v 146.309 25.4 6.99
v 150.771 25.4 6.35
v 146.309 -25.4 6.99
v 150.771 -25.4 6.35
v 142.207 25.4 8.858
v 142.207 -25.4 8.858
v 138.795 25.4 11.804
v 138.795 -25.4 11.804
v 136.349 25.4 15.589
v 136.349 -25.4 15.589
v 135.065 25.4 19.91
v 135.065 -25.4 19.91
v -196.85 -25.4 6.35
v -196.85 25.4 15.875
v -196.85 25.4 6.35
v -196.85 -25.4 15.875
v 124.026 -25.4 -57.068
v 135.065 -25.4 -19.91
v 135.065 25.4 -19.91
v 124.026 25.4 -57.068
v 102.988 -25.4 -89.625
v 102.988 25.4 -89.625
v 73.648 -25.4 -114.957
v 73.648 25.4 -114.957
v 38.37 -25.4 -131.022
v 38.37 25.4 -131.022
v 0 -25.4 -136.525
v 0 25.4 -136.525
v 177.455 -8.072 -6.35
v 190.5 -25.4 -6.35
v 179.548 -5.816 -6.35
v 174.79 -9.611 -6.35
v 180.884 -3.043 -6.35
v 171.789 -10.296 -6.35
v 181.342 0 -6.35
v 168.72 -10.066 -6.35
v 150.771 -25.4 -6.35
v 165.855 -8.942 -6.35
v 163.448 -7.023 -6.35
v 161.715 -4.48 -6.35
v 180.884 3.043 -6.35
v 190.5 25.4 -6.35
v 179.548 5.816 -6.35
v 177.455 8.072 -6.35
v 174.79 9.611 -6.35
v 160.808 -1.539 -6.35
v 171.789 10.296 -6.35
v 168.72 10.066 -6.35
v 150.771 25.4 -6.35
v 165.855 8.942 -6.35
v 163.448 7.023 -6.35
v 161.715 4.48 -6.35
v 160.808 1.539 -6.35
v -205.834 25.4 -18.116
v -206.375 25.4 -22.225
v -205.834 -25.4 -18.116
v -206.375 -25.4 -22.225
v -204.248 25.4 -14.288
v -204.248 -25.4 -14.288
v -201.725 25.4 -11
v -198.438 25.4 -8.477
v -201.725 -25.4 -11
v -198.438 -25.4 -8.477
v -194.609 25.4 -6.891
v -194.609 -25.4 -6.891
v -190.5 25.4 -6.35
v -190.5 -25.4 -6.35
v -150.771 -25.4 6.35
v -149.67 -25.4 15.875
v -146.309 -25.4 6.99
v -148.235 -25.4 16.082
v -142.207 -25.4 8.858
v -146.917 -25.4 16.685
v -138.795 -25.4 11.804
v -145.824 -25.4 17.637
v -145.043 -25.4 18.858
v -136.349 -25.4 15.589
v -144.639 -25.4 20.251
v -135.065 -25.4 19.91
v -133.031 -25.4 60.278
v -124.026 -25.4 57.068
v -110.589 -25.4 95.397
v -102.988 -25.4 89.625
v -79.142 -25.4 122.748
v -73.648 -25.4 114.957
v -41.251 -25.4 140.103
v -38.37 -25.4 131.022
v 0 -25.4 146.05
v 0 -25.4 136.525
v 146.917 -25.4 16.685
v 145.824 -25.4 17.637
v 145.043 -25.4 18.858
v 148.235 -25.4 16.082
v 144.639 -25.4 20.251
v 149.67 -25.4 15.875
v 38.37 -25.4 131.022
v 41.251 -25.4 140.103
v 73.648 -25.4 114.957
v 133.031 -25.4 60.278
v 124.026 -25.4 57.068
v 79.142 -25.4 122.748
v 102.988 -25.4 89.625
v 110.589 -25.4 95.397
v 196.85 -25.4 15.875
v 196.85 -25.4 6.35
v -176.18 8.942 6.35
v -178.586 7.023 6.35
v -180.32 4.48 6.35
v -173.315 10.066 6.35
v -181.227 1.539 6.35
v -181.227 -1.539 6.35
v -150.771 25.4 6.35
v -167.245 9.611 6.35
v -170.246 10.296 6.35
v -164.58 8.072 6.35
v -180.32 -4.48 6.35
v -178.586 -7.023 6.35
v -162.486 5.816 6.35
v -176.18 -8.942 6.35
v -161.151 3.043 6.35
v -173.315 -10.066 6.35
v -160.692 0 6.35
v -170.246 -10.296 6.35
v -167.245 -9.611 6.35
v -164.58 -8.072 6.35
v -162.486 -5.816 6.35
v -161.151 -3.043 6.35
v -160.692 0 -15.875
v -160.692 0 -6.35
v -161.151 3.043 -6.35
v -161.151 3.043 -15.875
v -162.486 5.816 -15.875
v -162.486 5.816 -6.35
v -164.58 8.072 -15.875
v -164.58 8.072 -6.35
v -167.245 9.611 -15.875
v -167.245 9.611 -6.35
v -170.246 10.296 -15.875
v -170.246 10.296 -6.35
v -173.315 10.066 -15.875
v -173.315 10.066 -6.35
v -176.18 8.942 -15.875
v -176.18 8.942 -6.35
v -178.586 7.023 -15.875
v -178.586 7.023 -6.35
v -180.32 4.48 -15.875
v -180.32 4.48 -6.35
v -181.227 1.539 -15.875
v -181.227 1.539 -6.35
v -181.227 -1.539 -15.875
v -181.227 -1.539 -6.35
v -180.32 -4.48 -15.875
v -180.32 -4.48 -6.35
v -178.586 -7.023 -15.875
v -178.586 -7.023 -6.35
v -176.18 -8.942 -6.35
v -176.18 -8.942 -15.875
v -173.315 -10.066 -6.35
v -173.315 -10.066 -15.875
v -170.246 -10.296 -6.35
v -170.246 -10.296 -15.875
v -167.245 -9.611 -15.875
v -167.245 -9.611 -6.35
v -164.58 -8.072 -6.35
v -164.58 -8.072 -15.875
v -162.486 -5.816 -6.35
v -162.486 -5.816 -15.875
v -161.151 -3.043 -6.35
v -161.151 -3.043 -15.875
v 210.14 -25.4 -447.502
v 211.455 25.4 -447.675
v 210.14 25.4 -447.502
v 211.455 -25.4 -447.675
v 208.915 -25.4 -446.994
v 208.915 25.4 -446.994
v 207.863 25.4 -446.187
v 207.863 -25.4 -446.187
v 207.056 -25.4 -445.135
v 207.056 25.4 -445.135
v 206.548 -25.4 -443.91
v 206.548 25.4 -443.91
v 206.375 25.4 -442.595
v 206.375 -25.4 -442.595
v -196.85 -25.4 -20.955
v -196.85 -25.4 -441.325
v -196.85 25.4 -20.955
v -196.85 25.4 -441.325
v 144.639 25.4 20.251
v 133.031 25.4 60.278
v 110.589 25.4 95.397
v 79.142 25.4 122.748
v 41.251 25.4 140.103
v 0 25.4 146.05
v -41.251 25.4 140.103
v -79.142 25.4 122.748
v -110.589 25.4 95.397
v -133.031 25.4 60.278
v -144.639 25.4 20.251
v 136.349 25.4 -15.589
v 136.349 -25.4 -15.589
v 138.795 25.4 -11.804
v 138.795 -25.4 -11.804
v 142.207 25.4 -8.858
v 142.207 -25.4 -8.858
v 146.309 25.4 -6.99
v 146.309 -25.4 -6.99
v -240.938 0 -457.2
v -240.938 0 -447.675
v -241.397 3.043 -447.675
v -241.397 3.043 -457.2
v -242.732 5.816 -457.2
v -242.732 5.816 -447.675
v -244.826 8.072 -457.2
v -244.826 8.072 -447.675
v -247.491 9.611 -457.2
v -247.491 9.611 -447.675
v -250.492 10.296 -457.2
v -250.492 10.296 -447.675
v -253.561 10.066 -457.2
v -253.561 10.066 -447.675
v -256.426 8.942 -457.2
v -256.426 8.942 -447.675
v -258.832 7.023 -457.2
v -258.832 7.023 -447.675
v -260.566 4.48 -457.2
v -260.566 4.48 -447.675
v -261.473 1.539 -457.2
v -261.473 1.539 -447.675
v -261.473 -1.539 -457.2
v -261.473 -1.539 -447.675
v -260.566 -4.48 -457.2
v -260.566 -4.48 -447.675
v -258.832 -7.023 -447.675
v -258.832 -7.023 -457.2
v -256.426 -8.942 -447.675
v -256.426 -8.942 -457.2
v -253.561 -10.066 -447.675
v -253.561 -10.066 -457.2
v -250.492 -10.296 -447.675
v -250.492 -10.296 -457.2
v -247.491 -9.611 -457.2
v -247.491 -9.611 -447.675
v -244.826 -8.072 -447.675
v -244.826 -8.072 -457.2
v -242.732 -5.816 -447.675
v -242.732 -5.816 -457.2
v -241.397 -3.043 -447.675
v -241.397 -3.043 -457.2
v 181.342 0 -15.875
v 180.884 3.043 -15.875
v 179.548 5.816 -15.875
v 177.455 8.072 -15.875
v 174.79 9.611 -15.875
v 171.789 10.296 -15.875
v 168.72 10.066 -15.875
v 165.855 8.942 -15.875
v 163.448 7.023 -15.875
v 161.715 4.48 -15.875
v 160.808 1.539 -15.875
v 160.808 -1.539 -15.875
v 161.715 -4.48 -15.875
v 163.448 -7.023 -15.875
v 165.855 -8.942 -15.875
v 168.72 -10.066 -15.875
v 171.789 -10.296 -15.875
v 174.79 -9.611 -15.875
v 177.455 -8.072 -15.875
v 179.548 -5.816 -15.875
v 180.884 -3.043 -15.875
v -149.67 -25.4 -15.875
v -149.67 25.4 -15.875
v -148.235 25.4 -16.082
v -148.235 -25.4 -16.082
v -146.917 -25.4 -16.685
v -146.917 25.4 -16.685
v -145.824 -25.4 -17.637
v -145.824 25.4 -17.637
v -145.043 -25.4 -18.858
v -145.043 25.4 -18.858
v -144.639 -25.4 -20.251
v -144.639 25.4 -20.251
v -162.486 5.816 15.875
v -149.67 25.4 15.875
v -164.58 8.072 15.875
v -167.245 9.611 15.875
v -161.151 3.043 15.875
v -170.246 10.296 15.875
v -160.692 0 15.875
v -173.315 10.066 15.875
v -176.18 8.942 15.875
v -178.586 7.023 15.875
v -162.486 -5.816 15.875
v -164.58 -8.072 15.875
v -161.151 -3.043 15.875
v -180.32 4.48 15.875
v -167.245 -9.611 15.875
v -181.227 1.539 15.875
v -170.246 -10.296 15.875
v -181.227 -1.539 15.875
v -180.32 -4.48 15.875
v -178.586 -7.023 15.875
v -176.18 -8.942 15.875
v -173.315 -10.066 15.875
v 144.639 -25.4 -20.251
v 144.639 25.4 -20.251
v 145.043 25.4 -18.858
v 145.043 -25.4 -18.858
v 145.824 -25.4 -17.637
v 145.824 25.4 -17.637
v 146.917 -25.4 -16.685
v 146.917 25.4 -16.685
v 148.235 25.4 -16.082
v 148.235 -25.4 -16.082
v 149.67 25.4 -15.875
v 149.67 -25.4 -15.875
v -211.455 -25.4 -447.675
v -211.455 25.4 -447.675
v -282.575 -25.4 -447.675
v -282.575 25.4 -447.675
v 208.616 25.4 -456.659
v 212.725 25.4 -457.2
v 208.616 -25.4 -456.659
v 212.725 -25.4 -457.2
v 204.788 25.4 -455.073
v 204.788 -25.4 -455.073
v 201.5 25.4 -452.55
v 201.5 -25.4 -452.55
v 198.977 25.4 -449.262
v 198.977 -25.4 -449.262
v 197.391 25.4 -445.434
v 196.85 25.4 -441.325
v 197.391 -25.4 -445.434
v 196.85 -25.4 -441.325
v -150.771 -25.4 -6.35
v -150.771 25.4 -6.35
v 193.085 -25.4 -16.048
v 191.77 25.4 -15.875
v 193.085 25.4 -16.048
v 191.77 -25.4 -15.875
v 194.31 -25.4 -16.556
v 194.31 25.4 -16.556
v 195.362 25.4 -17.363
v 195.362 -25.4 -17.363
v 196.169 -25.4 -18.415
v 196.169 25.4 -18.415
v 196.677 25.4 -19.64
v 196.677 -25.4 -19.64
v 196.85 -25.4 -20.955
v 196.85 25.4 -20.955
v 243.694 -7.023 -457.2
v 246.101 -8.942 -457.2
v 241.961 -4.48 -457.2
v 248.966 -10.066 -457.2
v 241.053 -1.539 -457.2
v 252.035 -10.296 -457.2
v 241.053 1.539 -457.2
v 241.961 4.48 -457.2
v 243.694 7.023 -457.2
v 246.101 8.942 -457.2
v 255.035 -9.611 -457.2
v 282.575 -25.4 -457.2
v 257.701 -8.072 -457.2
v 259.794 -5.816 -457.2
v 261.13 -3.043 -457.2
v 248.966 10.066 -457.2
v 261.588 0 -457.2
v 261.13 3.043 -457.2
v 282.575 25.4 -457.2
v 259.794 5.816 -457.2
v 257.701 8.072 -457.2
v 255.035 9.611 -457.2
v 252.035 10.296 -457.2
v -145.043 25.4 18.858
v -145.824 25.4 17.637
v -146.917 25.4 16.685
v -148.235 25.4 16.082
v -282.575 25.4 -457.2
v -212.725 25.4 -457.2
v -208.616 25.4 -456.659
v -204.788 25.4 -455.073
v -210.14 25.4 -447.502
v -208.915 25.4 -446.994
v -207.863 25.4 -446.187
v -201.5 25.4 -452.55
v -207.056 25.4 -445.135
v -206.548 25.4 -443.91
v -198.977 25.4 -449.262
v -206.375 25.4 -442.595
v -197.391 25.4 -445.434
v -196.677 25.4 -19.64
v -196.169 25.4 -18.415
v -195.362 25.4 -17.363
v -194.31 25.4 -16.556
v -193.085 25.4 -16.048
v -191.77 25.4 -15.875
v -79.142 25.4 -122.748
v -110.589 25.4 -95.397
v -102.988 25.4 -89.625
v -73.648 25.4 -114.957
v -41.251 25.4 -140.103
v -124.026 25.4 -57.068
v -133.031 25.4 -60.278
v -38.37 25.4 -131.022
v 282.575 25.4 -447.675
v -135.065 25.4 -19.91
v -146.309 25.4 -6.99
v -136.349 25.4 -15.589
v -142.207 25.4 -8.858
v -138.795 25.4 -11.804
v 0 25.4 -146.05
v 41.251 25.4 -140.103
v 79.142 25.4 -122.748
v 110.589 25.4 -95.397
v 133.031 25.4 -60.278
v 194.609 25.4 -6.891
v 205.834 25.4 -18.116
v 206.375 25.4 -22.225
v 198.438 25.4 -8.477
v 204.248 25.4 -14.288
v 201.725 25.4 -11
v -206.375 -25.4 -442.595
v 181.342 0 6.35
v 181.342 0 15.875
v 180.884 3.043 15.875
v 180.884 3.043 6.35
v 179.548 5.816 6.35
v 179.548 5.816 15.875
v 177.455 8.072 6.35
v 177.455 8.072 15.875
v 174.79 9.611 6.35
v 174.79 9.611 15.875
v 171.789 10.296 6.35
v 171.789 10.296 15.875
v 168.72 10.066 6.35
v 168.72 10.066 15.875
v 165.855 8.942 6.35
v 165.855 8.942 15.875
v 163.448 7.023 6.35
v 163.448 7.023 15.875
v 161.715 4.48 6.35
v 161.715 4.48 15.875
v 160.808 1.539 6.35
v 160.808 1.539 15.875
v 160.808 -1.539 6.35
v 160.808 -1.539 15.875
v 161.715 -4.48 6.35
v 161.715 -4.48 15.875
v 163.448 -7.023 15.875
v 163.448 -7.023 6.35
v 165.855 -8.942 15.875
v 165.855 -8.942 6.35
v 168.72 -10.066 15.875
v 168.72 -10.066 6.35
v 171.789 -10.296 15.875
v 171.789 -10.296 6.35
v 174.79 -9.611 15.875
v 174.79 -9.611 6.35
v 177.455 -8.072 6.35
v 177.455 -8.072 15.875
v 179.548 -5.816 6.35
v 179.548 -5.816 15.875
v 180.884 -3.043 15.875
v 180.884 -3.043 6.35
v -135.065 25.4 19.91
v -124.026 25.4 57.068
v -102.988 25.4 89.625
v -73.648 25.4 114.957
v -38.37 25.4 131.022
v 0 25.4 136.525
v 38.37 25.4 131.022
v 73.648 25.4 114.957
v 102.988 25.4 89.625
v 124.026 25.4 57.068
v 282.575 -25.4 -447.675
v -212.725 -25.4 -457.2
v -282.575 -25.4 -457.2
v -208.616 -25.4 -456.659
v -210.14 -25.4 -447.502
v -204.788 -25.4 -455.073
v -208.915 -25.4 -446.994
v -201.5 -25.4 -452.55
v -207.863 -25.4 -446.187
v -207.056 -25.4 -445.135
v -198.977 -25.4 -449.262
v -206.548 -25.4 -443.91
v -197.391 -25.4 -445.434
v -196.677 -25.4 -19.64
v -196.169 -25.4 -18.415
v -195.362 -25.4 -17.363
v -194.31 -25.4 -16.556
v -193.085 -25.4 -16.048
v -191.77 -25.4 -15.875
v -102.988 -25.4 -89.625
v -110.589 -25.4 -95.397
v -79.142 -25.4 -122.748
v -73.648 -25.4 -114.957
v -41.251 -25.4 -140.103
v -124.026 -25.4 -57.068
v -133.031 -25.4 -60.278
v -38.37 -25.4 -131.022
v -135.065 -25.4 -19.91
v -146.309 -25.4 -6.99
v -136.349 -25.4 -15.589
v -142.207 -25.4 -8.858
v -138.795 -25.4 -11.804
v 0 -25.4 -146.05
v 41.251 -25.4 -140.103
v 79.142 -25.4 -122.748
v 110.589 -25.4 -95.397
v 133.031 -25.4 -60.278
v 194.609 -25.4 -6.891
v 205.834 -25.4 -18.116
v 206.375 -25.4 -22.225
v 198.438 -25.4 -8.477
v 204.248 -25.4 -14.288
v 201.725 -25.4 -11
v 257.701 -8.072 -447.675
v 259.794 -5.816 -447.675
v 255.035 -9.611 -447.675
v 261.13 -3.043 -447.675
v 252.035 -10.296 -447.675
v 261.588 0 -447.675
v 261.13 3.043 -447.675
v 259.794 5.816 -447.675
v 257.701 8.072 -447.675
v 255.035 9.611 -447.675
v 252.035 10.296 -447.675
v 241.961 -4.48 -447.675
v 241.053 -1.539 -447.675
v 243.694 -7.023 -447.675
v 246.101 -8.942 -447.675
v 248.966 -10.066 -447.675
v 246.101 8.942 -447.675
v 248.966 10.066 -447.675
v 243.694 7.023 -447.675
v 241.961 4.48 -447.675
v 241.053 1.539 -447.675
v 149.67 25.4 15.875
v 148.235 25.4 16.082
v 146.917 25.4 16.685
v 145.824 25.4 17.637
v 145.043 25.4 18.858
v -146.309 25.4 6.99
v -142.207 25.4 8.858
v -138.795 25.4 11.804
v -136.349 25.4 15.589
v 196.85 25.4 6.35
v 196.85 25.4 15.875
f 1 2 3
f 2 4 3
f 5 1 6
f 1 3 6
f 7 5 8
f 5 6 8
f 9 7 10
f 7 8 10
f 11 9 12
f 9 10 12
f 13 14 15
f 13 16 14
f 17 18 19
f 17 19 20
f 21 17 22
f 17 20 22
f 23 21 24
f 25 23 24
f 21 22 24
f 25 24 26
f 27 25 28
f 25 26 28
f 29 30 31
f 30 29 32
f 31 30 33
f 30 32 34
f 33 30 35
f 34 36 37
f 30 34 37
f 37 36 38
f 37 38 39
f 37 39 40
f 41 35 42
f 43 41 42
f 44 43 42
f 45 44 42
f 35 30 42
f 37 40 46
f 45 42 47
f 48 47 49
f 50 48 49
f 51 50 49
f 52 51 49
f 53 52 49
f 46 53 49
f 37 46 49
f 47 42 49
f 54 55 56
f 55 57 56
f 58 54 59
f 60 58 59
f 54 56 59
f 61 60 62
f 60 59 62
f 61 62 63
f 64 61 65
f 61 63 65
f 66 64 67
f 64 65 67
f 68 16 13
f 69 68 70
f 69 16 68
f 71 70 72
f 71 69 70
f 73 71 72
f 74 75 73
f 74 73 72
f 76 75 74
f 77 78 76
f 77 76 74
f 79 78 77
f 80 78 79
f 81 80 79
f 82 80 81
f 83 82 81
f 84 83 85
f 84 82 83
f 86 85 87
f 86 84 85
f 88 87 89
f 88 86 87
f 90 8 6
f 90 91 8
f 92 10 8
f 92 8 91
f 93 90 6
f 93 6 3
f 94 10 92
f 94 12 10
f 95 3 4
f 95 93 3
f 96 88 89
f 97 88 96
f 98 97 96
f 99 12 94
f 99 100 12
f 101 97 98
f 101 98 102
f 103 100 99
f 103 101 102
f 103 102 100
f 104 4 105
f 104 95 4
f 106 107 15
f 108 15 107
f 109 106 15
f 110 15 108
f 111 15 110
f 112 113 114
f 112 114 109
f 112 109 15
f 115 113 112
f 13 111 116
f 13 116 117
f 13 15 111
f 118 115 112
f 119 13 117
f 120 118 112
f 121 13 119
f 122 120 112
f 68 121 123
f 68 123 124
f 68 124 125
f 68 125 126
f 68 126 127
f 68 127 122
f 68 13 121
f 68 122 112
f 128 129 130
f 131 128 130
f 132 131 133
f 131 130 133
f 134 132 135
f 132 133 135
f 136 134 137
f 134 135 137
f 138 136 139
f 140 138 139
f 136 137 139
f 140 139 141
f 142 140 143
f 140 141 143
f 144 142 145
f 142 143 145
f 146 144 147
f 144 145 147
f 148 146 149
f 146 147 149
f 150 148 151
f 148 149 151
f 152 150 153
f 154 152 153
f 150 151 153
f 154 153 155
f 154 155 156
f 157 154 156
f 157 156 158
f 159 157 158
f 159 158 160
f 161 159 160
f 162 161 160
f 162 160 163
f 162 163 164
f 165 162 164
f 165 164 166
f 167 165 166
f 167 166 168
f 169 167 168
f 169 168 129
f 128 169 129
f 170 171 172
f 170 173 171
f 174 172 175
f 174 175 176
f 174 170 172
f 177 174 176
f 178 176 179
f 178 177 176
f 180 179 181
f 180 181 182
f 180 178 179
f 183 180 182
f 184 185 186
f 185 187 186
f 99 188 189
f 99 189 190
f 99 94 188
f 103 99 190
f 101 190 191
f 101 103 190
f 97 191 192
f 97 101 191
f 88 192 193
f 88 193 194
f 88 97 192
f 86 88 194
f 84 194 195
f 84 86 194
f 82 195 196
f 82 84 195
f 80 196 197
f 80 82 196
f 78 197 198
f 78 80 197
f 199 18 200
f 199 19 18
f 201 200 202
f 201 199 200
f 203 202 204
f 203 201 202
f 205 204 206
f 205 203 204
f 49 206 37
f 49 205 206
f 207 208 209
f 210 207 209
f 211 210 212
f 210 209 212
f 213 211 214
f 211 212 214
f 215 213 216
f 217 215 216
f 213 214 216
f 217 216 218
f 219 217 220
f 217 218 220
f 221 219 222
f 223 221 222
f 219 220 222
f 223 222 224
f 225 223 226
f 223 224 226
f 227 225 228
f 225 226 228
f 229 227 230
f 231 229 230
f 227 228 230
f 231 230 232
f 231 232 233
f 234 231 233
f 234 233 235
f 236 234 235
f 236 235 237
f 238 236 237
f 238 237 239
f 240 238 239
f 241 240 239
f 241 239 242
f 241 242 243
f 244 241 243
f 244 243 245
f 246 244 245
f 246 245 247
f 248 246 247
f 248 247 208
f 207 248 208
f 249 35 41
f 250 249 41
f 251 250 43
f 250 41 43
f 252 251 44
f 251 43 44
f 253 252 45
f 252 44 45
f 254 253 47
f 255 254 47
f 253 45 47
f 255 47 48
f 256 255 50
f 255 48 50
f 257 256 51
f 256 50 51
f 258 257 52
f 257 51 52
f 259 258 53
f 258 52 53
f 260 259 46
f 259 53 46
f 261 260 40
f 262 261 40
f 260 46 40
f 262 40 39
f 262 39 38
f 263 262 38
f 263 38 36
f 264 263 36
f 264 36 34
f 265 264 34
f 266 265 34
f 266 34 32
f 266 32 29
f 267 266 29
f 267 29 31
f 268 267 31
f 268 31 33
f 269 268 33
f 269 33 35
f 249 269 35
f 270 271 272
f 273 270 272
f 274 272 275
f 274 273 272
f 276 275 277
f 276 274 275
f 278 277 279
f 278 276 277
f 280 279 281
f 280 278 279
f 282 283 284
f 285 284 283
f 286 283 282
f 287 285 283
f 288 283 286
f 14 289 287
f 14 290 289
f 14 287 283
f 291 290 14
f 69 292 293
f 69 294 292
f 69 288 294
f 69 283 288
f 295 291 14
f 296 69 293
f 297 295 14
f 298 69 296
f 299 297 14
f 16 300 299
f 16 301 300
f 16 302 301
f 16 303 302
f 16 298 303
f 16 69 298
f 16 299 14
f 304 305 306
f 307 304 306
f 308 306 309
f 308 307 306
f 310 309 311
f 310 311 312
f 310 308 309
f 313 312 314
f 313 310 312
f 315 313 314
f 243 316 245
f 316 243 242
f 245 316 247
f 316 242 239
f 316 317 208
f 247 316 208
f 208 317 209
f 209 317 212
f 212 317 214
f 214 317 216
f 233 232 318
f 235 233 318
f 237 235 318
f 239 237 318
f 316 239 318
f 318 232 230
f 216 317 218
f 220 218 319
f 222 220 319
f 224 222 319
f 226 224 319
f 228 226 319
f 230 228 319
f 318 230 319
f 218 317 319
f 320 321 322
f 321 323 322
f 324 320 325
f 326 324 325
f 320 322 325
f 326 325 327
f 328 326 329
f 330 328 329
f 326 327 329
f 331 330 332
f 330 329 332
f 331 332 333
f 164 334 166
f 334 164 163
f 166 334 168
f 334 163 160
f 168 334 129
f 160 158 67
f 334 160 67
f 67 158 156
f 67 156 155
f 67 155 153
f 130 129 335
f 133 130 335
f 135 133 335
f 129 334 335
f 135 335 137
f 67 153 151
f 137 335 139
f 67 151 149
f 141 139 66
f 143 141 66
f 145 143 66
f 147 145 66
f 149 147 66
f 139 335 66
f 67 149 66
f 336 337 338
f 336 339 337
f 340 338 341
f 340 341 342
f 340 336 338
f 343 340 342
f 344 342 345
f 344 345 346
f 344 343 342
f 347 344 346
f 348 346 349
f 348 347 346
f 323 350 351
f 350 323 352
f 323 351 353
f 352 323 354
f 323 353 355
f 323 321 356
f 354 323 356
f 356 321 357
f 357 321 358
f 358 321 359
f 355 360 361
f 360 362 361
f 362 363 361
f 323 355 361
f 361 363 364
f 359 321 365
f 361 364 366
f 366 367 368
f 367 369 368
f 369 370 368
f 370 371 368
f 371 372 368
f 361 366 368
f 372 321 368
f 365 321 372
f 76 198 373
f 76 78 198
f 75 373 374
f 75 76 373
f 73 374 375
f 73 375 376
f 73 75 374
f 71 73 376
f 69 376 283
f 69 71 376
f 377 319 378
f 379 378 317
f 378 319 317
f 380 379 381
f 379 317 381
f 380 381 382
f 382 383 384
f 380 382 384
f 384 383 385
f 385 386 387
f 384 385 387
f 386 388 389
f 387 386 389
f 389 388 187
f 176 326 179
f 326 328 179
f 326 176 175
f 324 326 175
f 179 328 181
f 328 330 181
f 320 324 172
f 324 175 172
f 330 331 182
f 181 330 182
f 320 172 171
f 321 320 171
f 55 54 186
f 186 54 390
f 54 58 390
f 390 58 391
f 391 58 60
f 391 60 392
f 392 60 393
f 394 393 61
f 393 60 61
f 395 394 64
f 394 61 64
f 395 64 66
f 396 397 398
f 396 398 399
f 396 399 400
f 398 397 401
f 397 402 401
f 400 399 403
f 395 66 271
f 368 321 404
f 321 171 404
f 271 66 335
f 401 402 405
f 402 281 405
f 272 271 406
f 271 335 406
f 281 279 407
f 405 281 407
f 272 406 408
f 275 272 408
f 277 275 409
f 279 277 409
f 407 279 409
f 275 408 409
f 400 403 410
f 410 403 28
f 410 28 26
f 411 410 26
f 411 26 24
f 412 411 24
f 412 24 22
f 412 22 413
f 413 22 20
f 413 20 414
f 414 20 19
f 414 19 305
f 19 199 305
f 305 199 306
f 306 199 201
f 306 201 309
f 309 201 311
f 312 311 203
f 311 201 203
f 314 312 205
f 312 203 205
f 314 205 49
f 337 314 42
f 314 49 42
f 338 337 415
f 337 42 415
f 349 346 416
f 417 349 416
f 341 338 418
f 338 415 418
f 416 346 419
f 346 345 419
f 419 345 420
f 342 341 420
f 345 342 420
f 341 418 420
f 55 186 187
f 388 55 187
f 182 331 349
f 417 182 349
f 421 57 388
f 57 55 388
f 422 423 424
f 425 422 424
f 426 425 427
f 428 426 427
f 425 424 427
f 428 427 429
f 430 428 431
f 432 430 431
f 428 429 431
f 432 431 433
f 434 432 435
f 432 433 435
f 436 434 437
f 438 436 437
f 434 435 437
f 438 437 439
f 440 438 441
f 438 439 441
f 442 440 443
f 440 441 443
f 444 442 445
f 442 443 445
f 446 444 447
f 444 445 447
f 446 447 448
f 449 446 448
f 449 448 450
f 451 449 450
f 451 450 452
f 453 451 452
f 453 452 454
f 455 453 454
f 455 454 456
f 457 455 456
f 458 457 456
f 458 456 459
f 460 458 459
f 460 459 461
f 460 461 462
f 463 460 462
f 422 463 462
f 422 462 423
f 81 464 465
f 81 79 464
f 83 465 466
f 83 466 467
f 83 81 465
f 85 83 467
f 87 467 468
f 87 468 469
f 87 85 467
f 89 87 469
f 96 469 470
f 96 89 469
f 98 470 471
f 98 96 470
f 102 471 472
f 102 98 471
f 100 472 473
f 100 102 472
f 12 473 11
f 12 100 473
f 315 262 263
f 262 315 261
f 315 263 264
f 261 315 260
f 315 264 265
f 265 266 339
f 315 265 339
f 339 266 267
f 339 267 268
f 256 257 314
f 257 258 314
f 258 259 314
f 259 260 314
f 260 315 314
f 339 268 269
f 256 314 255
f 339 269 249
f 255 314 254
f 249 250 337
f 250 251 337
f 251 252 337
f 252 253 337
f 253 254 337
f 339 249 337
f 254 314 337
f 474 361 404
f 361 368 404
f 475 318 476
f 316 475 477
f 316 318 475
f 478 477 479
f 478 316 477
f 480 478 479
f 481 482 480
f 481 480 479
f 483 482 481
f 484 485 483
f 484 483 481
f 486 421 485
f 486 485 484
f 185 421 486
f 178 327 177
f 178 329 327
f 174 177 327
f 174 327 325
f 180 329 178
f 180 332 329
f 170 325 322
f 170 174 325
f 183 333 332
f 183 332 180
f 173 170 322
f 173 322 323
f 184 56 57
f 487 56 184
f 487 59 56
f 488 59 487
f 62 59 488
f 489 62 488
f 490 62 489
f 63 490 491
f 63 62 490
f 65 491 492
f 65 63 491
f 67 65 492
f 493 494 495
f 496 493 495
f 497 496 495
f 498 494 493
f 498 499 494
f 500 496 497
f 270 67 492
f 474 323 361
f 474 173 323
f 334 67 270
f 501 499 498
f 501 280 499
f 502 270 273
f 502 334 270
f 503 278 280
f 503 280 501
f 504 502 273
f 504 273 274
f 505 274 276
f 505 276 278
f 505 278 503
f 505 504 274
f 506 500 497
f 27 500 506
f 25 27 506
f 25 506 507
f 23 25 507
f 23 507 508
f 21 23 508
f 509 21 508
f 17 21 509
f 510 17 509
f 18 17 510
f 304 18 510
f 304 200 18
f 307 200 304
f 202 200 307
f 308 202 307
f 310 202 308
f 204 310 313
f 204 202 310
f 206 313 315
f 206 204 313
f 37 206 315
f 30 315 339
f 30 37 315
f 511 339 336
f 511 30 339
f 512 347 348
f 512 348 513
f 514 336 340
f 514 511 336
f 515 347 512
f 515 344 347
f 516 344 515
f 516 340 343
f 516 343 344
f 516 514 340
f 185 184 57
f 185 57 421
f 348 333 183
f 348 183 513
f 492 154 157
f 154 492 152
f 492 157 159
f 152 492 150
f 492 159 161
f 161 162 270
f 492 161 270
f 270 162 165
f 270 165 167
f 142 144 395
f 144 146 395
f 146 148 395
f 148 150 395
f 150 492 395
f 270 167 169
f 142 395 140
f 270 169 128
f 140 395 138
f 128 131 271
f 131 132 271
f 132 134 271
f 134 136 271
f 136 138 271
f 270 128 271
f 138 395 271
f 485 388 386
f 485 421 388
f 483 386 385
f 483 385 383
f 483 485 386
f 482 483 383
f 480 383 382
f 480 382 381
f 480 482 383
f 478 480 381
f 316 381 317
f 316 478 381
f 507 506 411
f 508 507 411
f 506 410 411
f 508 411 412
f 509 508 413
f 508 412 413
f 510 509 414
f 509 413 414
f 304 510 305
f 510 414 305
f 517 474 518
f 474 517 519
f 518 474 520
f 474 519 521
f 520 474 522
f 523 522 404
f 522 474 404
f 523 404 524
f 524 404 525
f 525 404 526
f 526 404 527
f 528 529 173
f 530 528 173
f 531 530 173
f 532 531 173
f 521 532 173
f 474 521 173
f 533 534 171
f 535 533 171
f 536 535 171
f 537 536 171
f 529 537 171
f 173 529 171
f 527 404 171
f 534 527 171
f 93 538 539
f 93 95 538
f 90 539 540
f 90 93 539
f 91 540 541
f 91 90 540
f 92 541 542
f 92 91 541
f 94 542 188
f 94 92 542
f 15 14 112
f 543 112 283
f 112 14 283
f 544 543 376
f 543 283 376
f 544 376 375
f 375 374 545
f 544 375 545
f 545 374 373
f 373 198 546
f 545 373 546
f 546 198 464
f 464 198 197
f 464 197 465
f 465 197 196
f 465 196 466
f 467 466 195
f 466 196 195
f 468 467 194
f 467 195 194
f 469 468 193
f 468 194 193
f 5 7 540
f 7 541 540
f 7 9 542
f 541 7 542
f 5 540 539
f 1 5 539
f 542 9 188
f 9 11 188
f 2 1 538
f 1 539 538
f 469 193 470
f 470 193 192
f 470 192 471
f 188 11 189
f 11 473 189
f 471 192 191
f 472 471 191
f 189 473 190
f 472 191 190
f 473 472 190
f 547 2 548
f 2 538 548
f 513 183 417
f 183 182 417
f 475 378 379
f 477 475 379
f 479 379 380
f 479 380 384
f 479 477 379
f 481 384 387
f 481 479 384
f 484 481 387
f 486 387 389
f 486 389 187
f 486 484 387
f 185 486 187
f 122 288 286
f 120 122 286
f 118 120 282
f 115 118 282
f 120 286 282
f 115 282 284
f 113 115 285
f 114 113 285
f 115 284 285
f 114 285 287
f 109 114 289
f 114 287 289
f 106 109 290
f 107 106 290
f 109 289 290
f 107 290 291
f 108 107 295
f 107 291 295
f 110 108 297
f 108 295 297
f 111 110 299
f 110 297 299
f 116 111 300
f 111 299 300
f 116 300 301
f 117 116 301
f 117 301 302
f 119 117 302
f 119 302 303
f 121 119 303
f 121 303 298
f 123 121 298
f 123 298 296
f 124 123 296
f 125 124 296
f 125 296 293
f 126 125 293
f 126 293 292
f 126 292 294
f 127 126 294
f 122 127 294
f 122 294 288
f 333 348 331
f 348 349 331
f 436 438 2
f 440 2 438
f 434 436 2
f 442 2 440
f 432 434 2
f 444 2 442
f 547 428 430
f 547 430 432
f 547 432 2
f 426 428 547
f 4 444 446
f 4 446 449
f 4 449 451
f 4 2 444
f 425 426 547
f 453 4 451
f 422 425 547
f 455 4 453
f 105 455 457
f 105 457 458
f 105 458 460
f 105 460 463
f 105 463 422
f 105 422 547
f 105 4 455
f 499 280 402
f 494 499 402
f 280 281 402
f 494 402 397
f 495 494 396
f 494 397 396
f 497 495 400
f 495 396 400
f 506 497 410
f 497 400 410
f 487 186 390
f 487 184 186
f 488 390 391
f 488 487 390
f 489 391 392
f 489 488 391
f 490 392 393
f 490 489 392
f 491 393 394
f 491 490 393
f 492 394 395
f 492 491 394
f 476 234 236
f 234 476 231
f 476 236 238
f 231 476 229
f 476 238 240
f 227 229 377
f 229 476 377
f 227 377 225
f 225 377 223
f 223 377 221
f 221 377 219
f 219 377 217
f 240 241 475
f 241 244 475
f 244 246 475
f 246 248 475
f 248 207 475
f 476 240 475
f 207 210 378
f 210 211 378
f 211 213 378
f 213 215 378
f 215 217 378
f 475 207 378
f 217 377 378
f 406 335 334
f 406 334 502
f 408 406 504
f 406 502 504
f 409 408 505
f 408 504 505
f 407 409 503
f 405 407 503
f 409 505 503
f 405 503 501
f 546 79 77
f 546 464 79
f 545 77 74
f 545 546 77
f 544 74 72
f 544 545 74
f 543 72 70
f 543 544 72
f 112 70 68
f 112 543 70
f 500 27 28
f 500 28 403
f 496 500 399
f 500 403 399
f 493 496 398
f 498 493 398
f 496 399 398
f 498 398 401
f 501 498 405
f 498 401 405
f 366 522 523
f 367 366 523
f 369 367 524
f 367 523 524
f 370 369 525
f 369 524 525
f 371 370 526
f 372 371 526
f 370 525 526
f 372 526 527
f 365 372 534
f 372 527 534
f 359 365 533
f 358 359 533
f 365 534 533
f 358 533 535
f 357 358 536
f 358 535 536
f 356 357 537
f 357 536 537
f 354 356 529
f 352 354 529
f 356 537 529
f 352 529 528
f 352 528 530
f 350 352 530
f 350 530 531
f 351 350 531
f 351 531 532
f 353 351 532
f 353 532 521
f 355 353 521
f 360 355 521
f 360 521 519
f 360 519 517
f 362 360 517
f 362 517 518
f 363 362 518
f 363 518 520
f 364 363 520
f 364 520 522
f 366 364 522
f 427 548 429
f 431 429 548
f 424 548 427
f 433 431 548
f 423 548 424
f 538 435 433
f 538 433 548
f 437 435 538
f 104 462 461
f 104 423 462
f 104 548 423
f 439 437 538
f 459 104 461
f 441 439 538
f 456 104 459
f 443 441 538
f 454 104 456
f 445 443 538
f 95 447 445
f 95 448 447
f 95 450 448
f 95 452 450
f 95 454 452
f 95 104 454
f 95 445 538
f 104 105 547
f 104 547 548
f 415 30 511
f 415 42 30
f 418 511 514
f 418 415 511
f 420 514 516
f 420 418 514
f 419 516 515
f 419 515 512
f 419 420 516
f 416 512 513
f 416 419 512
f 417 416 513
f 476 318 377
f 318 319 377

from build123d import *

# Parameters (mm, degrees)
F1_DEPTH = 25.4
F2_R     = 10.3251
F3_DEPTH = 473.076
F4_R     = 10.3251
F5_DEPTH = 25.4
F6_R     = 5.08
F7_R     = 15.875


with BuildPart() as f1:
    # F0 (on Front) → F1 (new body, symmetric)
    with BuildSketch(Plane.XZ):
        with BuildLine():
            ThreePointArc((0, -136.525), (-94.265959, -98.757302), (-136.377246, -6.35))
            Line((-136.377246, -6.35), (-196.85, -6.35))
            Line((-196.85, -6.35), (-206.375, -6.35))
            Line((-206.375, -6.35), (-206.375, -447.675))
            Line((-206.375, -447.675), (-282.575, -447.675))
            Line((-282.575, -447.675), (-282.575, -457.2))
            Line((-282.575, -457.2), (-196.85, -457.2))
            Line((-196.85, -457.2), (-196.85, -15.875))
            Line((-196.85, -15.875), (-145.184665, -15.875))
            ThreePointArc((-145.184665, -15.875), (-97.498869, -108.740853), (0, -146.05))
            Line((0, -146.05), (0, -136.525))
        make_face()
        with BuildLine():
            ThreePointArc((-136.377246, 6.35), (0, 136.525), (136.377246, 6.35))
            Line((136.377246, 6.35), (196.85, 6.35))
            Line((196.85, 6.35), (196.85, 15.875))
            Line((196.85, 15.875), (145.184665, 15.875))
            ThreePointArc((145.184665, 15.875), (0, 146.05), (-145.184665, 15.875))
            Line((-145.184665, 15.875), (-196.85, 15.875))
            Line((-196.85, 15.875), (-196.85, 6.35))
            Line((-196.85, 6.35), (-136.377246, 6.35))
        make_face()
        with BuildLine():
            ThreePointArc((136.377246, -6.35), (94.265959, -98.757302), (0, -136.525))
            Line((0, -136.525), (0, -146.05))
            ThreePointArc((0, -146.05), (97.498869, -108.740853), (145.184665, -15.875))
            Line((145.184665, -15.875), (196.85, -15.875))
            Line((196.85, -15.875), (196.85, -6.35))
            Line((196.85, -6.35), (136.377246, -6.35))
        make_face()
        Polygon((206.375, -6.35), (196.85, -6.35), (196.85, -15.875), (196.85, -457.2), (282.575, -457.2), (282.575, -447.675), (206.375, -447.675), align=None)
    extrude(amount=F1_DEPTH, both=True)

    # F2 (on face) → F3 (cut, through all)
    with BuildSketch(Plane.XY.offset(15.875)):
        with Locations((-171.017332, 0)):
            Circle(F2_R)
        with Locations((171.017332, 0)):
            Circle(F2_R)
    extrude(amount=-F3_DEPTH, mode=Mode.SUBTRACT)

    # F4 (on face) → F5 (cut)
    with BuildSketch(Plane.XY.offset(-447.675)):
        with Locations((-251.263201, 0)):
            Circle(F4_R)
        with Locations((251.263201, 0)):
            Circle(F4_R)
    extrude(amount=-F5_DEPTH, mode=Mode.SUBTRACT)

    # F6
    f6_edges = [f1.edges().sort_by_distance(p)[0] for p in [
        (-206.375, 0, -447.675),
        (-145.184665, 0, 15.875),
        (145.184665, 0, 15.875),
        (206.375, 0, -447.675),
        (196.85, 0, -15.875),
        (145.184665, 0, -15.875),
        (-196.85, 0, -15.875),
        (-145.184665, 0, -15.875),
    ]]
    fillet(f6_edges, radius=F6_R)

    # F7
    f7_edges = [f1.edges().sort_by_distance(p)[0] for p in [
        (-136.377246, 0, -6.35),
        (-206.375, 0, -6.35),
        (-136.377246, 0, 6.35),
        (206.375, 0, -6.35),
        (136.377246, 0, -6.35),
        (136.377246, 0, 6.35),
        (-196.85, 0, -457.2),
        (196.85, 0, -457.2),
    ]]
    fillet(f7_edges, radius=F7_R)


solid = f1.part
